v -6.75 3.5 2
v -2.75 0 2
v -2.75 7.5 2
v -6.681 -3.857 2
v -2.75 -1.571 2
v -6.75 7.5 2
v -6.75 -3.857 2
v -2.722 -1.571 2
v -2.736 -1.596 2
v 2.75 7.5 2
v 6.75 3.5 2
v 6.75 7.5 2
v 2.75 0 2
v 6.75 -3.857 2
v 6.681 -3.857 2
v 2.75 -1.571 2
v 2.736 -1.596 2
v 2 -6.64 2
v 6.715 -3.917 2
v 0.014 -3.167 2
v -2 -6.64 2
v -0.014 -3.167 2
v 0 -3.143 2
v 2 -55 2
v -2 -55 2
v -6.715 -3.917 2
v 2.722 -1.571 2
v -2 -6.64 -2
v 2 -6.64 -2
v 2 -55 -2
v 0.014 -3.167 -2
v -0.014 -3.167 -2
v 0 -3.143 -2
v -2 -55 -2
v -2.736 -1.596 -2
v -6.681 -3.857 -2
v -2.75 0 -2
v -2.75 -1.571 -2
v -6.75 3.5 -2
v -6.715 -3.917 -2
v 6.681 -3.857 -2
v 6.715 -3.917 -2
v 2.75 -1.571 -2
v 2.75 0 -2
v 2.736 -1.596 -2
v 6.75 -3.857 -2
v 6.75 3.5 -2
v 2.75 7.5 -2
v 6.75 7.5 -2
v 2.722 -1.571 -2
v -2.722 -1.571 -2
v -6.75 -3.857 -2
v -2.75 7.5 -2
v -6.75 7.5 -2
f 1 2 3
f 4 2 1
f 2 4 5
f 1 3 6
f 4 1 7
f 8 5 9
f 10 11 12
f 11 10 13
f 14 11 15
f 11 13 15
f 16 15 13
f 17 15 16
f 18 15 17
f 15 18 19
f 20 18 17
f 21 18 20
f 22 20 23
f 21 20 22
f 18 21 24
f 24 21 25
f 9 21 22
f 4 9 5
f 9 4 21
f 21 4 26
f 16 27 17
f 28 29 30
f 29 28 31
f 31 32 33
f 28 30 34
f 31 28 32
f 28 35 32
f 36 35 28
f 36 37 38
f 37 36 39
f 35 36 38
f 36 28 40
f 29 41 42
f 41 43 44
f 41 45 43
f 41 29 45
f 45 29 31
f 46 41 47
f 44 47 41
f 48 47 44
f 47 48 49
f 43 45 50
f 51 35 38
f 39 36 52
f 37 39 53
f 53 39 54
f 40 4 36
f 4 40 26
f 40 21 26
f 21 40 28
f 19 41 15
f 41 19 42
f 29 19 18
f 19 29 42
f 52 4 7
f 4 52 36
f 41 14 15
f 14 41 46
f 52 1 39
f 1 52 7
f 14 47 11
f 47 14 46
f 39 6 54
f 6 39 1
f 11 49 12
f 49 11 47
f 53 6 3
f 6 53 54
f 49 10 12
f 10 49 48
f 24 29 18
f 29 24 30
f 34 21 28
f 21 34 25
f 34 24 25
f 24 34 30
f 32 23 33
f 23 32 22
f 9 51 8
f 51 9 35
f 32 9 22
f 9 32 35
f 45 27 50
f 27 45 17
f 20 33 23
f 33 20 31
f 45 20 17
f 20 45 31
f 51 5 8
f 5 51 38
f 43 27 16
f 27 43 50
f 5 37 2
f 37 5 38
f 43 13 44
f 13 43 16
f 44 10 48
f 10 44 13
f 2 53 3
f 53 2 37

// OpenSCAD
// [FL_INDEX: keywords="openscad, 3d_parametric, Parametric_Wrench, csg_solid" | COT="Parametric OpenSCAD design from 3DCodeverse"]
// Title: Parametric Wrench

include <MCAD/shapes.scad>

// http://www.engineersedge.com/iso_hex_head_screw.htm

size = 5.5;
height = 4;

bar_length = 10*size;

wall_size = max(4, size/4);



difference () {
 union () {
  // The outisde of the bit that actually holds the nut.
  rotate(a=30, v=[0, 0, 1])
   hexagon(height=height, size=size+wall_size*2);
  
  translate([0, size, 0])
   rotate(a=90, v=[0, 0, 1])
    cube([wall_size, size+wall_size*2, height], center=true);
  

  // The bar / handle
  translate([0, -bar_length/2, 0])
   cube([wall_size, bar_length, height], center=true);
 }
 
 union() {
  translate([-size/2, 0, -height/2-0.05])
   cube([size, size+wall_size, height+0.1]);

  rotate(a=30, v=[0, 0, 1])
   hexagon(height=height+0.1, size=size);
 }

}
